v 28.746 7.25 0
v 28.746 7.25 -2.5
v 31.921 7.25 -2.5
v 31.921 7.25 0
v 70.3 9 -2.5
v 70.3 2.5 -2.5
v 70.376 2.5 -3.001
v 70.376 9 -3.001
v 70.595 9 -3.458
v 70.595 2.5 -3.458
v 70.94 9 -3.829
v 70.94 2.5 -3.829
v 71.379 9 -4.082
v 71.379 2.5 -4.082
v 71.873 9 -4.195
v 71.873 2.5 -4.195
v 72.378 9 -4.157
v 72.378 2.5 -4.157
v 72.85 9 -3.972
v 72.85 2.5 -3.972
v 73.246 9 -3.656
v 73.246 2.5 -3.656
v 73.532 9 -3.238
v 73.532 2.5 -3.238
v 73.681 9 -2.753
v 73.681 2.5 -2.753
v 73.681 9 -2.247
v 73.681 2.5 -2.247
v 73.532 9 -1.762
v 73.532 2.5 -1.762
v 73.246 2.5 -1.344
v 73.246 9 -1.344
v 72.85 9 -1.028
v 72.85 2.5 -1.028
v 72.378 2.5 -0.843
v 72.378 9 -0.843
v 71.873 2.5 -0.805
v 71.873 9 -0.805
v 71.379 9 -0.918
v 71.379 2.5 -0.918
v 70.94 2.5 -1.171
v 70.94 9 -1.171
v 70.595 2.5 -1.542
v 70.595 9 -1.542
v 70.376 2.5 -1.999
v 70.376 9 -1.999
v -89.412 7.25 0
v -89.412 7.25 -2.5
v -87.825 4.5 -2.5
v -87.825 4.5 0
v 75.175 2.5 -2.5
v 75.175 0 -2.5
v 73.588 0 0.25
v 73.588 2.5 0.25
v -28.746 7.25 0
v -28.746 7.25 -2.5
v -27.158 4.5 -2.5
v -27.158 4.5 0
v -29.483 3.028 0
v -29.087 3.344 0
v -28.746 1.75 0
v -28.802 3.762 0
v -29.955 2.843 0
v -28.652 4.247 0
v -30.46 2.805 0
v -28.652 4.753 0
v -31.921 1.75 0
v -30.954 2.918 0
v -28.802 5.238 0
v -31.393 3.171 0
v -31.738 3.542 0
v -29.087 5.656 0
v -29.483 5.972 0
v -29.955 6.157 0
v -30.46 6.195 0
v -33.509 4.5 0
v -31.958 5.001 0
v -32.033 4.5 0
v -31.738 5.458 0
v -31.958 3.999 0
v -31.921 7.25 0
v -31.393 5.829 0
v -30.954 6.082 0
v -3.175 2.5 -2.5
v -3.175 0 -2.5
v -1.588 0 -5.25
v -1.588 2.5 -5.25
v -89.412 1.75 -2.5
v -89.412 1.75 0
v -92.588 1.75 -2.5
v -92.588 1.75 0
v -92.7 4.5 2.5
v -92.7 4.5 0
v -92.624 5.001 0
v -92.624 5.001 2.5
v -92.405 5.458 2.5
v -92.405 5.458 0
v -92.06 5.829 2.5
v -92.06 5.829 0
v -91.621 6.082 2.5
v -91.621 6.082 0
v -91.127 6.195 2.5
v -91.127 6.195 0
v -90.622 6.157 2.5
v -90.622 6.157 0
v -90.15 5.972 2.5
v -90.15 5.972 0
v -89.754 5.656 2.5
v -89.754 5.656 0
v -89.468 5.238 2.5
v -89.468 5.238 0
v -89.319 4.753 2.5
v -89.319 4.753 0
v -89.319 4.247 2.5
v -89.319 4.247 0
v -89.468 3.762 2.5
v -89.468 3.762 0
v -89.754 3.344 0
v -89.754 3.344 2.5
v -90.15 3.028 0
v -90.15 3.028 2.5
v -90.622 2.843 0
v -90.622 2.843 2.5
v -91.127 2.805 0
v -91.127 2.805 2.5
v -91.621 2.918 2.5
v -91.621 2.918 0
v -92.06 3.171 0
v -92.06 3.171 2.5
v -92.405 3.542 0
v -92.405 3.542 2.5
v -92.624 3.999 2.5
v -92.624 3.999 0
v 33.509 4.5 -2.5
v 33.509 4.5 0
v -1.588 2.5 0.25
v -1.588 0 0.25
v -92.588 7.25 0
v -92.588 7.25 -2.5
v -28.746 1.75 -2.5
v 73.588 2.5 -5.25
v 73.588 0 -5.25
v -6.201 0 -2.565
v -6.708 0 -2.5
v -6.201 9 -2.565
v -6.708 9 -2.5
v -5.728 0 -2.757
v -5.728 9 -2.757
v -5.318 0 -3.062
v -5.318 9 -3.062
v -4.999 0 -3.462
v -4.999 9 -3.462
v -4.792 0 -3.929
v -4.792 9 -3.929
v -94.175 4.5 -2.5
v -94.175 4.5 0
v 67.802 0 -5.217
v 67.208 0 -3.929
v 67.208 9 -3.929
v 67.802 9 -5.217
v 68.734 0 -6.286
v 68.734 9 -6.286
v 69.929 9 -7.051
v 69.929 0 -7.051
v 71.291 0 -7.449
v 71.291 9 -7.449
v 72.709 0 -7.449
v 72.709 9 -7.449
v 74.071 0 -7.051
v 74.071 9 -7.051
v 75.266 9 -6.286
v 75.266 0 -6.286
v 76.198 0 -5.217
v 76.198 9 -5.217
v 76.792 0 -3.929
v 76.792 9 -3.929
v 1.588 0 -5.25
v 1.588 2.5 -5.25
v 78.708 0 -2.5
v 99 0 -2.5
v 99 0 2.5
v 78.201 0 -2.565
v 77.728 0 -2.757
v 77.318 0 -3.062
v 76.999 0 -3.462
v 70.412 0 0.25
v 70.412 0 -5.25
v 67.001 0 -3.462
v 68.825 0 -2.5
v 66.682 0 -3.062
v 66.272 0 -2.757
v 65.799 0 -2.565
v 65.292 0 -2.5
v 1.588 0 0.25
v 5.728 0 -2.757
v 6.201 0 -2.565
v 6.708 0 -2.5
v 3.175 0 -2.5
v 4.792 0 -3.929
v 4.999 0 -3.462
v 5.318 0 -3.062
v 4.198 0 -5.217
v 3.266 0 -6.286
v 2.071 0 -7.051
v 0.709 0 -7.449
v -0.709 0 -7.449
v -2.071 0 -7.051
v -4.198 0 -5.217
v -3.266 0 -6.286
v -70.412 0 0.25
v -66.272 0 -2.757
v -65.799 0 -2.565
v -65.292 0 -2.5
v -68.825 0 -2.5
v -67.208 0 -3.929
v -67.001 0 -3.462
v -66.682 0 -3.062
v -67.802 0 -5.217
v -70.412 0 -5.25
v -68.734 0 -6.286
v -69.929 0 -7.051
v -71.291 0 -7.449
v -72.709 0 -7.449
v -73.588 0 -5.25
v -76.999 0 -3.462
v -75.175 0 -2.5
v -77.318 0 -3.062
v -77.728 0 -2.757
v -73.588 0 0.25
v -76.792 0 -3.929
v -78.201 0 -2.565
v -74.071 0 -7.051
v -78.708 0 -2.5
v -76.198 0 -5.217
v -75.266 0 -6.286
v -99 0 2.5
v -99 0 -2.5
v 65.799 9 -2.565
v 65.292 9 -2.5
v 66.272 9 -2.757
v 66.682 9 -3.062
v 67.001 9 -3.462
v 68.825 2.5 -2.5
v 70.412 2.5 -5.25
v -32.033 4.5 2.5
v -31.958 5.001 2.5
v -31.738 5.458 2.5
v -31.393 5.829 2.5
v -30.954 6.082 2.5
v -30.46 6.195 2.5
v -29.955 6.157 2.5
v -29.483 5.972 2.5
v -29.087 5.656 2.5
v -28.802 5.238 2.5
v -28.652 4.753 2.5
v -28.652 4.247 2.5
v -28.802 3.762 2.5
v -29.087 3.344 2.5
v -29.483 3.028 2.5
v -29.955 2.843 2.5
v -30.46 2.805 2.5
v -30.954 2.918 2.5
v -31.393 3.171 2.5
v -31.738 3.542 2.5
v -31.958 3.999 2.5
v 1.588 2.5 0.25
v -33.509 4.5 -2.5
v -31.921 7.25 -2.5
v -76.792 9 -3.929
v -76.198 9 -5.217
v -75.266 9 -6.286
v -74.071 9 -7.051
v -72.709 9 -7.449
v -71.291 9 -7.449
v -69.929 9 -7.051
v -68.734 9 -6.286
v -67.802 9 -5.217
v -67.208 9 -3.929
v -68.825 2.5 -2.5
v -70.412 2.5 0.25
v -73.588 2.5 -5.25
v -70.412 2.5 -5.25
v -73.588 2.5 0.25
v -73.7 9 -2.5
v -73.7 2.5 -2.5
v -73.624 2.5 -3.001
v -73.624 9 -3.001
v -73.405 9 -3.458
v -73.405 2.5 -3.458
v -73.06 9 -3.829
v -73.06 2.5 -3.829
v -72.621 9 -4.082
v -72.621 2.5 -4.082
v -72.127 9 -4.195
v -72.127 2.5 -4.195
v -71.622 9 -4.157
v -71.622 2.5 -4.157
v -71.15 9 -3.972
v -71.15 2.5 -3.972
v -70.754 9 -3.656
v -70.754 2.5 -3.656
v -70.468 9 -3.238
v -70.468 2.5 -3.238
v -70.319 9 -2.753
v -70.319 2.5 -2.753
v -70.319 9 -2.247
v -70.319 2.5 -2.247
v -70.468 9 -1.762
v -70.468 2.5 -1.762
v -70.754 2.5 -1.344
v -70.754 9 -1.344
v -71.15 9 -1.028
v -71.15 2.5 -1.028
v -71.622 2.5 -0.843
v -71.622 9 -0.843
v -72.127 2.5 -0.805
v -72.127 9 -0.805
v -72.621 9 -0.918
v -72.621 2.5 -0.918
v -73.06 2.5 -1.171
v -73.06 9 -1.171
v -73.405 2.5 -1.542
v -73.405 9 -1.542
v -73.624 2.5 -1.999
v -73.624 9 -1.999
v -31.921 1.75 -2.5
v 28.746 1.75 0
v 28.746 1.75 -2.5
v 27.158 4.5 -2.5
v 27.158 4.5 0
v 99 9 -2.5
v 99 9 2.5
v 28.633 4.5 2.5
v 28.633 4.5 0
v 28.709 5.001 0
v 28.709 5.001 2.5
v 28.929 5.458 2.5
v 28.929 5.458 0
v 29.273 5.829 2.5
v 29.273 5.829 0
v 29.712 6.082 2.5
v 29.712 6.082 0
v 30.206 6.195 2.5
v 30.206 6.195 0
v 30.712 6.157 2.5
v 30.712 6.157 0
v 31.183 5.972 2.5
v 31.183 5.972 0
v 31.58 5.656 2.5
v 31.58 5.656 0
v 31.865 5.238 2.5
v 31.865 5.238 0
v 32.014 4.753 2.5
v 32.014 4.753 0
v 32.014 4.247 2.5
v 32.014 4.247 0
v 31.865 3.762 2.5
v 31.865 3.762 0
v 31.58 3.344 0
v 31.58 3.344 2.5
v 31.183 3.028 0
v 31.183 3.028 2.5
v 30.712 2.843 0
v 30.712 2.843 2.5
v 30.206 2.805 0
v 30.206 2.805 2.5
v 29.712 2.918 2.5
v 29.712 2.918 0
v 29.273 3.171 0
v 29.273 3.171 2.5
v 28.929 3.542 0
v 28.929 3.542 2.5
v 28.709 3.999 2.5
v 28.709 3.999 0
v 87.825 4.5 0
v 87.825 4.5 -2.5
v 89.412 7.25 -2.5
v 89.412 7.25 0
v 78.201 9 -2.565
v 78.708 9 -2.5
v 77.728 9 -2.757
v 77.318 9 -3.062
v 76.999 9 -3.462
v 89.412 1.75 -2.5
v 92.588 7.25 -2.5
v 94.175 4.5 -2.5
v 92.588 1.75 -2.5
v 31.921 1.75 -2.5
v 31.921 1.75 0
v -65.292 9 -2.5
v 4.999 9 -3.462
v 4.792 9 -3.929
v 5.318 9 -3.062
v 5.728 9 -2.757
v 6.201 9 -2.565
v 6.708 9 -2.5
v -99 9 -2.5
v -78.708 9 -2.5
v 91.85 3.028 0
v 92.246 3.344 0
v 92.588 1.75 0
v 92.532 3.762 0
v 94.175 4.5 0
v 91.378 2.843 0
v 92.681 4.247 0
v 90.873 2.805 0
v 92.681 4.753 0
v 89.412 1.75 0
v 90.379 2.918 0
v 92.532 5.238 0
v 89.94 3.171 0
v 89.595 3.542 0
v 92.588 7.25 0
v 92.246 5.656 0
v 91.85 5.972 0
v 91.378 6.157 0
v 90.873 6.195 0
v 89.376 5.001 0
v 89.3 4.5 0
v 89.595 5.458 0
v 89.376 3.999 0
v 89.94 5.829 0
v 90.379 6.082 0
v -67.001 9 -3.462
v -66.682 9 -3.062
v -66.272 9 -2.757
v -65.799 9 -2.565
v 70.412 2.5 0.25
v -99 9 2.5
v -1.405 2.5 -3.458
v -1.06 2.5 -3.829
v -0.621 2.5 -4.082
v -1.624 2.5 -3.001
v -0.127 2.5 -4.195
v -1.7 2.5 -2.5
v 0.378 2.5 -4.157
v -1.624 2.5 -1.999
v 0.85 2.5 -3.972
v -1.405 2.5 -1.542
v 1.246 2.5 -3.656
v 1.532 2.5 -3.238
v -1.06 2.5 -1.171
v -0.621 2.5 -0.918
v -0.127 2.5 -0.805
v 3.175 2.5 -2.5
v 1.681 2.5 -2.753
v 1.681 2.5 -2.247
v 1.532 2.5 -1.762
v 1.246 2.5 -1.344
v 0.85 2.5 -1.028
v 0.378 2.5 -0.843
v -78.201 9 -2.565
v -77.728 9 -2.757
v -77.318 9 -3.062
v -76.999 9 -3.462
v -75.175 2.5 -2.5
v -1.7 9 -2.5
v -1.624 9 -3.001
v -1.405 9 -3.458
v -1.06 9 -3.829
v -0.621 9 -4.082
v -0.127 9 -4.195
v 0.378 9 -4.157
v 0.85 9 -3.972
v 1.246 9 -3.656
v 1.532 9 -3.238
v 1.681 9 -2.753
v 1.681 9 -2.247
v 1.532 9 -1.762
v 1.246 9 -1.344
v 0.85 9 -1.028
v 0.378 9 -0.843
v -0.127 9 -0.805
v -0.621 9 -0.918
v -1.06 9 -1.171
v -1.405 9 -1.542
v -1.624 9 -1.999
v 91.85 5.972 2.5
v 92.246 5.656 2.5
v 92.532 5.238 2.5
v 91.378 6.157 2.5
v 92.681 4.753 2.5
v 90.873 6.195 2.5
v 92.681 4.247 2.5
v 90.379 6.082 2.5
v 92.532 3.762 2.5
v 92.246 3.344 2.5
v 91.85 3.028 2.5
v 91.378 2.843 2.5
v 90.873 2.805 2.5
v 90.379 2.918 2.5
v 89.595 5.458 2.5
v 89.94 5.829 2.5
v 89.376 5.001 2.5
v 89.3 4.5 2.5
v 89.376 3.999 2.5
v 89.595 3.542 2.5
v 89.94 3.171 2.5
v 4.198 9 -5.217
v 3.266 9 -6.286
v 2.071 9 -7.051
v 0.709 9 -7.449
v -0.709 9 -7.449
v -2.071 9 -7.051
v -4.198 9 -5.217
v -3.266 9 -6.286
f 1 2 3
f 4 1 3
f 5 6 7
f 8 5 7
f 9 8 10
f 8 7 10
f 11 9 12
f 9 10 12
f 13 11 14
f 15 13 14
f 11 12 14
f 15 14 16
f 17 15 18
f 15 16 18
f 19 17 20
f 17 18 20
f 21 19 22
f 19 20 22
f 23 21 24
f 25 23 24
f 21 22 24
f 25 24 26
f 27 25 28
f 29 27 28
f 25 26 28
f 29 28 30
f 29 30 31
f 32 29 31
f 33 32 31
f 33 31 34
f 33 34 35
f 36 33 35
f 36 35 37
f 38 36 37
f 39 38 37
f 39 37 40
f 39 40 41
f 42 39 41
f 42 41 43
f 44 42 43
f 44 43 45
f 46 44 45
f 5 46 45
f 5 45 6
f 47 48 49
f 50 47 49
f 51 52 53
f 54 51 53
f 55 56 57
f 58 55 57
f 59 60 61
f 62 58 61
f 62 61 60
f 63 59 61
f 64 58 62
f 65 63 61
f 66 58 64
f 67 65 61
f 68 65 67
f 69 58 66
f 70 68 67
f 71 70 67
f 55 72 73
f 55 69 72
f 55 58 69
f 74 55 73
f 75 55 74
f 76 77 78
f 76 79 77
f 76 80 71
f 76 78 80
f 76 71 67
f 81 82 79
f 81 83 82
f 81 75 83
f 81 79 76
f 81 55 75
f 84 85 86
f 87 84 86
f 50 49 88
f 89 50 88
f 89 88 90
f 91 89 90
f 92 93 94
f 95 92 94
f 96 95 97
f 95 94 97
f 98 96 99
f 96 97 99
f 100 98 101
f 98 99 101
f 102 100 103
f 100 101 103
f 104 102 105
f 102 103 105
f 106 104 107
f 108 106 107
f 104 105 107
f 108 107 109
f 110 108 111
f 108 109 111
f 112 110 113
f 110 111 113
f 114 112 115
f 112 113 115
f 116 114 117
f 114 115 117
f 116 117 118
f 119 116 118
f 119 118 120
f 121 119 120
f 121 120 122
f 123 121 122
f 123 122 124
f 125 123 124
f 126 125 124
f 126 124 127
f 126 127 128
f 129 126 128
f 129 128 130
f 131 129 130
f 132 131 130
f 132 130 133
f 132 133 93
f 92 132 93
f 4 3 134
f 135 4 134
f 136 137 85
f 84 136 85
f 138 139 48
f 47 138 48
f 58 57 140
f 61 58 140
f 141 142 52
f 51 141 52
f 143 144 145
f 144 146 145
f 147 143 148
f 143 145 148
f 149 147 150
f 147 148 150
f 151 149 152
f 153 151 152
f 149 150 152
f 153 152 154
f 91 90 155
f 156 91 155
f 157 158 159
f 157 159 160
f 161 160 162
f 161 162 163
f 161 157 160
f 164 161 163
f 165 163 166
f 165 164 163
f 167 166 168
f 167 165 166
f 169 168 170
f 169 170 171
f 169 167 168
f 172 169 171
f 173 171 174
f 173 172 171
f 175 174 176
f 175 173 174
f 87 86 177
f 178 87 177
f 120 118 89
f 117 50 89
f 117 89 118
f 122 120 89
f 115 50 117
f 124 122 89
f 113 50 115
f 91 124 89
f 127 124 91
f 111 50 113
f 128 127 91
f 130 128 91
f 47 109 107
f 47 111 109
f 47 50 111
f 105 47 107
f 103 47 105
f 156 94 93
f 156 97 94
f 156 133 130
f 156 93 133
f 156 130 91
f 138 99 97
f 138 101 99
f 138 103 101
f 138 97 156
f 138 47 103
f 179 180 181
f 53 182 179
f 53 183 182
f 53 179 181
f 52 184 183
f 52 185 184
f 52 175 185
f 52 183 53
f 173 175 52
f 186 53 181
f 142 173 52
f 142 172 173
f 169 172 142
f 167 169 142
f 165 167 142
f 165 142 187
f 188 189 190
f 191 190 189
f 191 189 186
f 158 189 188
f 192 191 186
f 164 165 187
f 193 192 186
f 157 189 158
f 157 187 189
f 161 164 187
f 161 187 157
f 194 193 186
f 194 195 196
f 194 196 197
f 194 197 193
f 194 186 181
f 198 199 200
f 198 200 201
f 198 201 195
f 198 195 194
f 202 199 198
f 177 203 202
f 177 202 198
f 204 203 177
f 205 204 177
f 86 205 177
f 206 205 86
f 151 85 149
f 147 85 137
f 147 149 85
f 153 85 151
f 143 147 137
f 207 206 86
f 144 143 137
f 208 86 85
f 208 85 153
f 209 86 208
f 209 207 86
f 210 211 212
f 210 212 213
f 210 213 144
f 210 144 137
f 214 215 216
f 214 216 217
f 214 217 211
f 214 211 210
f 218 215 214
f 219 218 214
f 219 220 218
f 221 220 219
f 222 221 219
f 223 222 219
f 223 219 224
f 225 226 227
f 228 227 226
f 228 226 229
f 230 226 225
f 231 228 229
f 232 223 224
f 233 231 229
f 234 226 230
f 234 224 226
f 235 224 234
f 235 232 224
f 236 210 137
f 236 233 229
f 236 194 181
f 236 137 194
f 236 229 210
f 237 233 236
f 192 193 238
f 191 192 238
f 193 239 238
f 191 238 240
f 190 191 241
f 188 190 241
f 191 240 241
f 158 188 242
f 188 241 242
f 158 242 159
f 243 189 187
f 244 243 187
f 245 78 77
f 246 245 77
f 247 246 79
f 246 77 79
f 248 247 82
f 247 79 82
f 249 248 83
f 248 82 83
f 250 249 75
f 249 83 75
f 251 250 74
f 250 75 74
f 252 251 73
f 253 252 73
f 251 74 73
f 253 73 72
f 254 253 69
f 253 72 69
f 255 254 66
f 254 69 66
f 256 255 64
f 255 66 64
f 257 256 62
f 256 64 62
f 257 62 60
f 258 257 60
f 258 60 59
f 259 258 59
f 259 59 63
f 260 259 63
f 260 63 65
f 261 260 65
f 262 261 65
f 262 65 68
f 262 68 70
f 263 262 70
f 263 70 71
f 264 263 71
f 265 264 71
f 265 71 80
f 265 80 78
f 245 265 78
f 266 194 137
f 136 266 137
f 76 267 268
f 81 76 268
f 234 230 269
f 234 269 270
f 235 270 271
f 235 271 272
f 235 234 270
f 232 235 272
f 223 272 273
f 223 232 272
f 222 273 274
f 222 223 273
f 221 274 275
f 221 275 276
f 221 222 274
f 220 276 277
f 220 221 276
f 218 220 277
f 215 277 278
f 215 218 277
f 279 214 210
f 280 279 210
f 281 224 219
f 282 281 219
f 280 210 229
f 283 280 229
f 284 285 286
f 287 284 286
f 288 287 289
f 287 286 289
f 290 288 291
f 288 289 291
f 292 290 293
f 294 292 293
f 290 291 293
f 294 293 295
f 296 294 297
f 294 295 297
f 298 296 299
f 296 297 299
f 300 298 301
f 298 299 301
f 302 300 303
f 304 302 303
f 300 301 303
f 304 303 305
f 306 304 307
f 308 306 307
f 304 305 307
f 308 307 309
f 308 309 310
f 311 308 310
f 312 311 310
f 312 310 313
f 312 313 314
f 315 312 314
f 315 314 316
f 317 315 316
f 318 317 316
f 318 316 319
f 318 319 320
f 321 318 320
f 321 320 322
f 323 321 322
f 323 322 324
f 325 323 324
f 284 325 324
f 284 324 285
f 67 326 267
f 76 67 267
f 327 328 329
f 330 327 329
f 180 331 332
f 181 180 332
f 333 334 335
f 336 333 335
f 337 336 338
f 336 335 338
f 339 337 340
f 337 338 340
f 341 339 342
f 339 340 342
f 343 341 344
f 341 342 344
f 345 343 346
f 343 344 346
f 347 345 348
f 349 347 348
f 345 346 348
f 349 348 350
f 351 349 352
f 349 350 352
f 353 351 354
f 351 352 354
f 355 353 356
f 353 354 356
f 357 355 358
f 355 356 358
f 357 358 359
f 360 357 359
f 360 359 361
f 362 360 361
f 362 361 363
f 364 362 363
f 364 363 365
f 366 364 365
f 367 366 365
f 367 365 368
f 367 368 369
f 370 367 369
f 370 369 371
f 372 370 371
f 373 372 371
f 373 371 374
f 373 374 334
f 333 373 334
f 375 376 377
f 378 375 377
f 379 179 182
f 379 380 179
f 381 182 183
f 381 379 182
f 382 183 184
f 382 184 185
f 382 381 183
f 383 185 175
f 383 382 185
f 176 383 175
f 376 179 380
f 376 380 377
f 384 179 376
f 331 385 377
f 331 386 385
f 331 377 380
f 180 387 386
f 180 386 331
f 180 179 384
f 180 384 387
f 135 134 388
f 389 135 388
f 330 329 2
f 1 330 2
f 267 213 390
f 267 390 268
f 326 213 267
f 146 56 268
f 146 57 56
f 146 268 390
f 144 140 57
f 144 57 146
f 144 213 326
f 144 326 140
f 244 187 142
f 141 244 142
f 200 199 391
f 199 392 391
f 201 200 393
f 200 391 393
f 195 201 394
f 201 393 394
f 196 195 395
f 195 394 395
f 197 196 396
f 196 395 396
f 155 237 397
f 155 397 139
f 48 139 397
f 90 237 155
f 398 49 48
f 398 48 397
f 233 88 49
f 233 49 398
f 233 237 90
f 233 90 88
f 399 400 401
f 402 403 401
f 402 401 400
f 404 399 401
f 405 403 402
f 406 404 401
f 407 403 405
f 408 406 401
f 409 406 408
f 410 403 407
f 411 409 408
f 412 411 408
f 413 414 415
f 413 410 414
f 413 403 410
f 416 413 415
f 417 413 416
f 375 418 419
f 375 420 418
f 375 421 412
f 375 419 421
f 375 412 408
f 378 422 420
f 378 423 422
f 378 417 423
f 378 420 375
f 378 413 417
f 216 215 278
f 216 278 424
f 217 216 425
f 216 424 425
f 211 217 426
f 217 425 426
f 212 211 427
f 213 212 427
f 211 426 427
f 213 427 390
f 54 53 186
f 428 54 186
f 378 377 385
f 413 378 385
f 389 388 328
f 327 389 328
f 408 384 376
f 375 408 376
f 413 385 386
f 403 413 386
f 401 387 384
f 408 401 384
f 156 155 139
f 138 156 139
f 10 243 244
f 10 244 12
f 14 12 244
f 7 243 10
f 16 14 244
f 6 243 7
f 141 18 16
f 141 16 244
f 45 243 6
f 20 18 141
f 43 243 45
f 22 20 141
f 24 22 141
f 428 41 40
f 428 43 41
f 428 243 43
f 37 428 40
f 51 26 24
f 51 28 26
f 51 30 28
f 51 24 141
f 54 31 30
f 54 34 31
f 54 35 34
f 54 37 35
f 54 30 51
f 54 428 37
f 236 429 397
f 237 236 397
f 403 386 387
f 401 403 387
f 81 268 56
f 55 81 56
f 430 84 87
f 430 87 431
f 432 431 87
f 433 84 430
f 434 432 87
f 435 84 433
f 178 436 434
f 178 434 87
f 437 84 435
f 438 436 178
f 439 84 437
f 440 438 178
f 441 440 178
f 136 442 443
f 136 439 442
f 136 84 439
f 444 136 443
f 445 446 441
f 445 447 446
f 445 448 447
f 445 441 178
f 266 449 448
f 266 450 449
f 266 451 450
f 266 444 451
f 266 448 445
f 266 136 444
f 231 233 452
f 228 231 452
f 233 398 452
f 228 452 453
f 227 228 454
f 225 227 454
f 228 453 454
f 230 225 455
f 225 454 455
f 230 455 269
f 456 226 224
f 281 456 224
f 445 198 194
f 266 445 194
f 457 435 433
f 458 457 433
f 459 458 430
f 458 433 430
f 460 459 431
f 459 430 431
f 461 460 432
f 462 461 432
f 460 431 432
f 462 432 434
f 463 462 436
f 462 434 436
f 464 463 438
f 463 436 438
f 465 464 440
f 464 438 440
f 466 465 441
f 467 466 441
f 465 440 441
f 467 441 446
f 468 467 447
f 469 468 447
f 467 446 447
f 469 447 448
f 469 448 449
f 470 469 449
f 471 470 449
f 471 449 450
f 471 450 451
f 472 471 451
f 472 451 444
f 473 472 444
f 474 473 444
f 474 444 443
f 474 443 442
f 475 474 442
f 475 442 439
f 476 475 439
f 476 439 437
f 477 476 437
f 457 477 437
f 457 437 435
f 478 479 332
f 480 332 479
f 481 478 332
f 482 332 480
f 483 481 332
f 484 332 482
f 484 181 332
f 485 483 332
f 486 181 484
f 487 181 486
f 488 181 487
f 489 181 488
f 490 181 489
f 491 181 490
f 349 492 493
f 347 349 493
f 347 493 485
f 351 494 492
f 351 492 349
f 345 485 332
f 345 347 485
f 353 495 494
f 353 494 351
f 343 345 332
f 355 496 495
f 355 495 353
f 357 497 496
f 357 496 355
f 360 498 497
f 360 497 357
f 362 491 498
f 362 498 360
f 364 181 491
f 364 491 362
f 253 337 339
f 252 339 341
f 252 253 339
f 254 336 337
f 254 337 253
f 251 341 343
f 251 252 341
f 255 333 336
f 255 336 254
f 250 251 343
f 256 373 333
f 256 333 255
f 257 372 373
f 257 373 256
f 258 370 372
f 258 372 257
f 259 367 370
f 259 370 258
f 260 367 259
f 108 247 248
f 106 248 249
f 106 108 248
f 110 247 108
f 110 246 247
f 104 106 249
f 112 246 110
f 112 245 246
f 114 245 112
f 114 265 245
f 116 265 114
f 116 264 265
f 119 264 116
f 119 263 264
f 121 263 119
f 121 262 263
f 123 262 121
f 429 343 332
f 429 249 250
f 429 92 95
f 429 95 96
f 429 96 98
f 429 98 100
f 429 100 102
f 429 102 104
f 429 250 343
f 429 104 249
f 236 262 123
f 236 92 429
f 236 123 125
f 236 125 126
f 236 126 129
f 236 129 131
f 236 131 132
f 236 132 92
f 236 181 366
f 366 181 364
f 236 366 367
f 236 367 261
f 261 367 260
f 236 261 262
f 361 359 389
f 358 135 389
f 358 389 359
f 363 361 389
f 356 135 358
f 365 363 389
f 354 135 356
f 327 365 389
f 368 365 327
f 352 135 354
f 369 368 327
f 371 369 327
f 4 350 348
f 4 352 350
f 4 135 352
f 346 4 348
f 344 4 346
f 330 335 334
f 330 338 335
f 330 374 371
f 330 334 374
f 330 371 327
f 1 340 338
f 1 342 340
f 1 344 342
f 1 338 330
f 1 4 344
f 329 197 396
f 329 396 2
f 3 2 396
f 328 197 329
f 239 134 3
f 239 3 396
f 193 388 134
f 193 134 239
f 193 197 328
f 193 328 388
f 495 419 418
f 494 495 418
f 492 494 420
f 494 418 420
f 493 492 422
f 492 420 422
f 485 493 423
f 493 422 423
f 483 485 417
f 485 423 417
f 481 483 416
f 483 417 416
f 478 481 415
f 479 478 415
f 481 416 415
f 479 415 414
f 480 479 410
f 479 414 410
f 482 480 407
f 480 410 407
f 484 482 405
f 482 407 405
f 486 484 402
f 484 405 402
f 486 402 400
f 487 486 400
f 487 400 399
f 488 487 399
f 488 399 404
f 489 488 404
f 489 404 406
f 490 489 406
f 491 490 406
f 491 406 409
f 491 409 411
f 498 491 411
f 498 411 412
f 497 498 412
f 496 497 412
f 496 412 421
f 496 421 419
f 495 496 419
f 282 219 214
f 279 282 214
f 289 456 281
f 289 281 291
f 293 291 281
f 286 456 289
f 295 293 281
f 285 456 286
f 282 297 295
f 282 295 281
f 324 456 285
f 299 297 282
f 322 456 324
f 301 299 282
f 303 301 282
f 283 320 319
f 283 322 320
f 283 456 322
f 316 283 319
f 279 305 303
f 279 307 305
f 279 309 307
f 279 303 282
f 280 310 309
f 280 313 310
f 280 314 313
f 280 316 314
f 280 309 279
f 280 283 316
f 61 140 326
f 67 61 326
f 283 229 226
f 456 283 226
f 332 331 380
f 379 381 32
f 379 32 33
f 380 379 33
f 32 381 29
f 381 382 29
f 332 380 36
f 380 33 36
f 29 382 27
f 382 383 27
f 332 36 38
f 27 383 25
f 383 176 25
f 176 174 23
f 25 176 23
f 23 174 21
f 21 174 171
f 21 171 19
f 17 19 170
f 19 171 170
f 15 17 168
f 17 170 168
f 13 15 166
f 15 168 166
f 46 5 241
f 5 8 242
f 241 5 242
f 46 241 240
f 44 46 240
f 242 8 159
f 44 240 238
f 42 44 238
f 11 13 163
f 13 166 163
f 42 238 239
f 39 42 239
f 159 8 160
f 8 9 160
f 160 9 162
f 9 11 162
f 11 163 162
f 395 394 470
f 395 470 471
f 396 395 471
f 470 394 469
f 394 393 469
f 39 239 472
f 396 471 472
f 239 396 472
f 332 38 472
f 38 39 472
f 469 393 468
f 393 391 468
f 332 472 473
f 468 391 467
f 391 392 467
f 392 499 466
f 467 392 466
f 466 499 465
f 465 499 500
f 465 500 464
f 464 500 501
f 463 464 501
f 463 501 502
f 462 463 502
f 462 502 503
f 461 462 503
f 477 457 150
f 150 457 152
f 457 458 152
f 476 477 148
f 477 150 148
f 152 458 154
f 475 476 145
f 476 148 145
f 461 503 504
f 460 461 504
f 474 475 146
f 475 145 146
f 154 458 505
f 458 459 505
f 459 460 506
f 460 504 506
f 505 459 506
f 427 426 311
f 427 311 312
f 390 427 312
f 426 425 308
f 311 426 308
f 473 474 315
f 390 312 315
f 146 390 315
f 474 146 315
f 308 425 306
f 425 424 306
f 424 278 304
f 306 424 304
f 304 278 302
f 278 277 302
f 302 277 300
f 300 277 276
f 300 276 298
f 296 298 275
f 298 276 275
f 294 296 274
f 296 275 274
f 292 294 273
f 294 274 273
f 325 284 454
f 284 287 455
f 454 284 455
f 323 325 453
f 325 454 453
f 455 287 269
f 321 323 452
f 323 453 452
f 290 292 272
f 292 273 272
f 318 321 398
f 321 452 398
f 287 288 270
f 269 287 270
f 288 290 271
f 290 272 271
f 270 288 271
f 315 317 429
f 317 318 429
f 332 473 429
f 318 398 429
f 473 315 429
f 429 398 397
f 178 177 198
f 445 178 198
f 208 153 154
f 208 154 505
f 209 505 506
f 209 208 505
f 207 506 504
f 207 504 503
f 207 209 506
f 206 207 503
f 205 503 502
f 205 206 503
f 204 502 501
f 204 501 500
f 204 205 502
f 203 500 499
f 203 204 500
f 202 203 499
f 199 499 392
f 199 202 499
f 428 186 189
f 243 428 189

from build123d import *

# Parameters (mm, degrees)
BOSS_EXTRU_1_DEPTH      = 9
D_GAGEMENT_M31_D        = 3.4
ENL_V_MAT_EXTRU_1_DEPTH = 2.5
D_GAGEMENT_M32_D        = 3.4
ENL_V_MAT_EXTRU_2_DEPTH = 2.5
CONG_1_R                = 2


with BuildPart() as part:
    # Esquisse1 → Boss.-Extru.1 (new body)
    with BuildSketch(Plane(origin=(0, 0, 0), x_dir=(1, 0, 0), z_dir=(0, 1, 0))):
        with BuildLine():
            Line((-99, 2.5), (-77, 2.5))
            ThreePointArc((-77, 2.5), (-72, 7.5), (-67, 2.5))
            Line((-67, 2.5), (-5, 2.5))
            ThreePointArc((-5, 2.5), (0, 7.5), (5, 2.5))
            Line((5, 2.5), (67, 2.5))
            ThreePointArc((67, 2.5), (72, 7.5), (77, 2.5))
            Line((77, 2.5), (99, 2.5))
            Line((99, 2.5), (99, -2.5))
            Line((99, -2.5), (-99, -2.5))
            Line((-99, -2.5), (-99, 2.5))
        make_face()
    extrude(amount=BOSS_EXTRU_1_DEPTH)

    # Dégagement M31 (through all)
    with Locations(Plane(origin=(0, 9, 0), x_dir=(1, 0, 0), z_dir=(0, 1, 0))):
        with Locations((-72, 2.5), (0, 2.5), (72, 2.5)):
            Hole(D_GAGEMENT_M31_D / 2)

    # Esquisse5 → Enlèv. mat.-Extru.1 (cut)
    with BuildSketch(Plane.XZ):
        Polygon((70.41228676, -5.25), (73.58771324, -5.25), (75.175426481, -2.5), (73.58771324, 0.25), (70.41228676, 0.25), (68.824573519, -2.5), align=None)
        Polygon((-1.58771324, -5.25), (1.58771324, -5.25), (3.175426481, -2.5), (1.58771324, 0.25), (-1.58771324, 0.25), (-3.175426481, -2.5), align=None)
        Polygon((-73.58771324, -5.25), (-70.41228676, -5.25), (-68.824573519, -2.5), (-70.41228676, 0.25), (-73.58771324, 0.25), (-75.175426481, -2.5), align=None)
    extrude(amount=-ENL_V_MAT_EXTRU_1_DEPTH, mode=Mode.SUBTRACT)

    # Dégagement M32 (through all)
    with Locations(Plane.XY.offset(2.5)):
        with Locations((-91, 4.5), (-30.333333333, 4.5), (30.333333333, 4.5), (91, 4.5)):
            Hole(D_GAGEMENT_M32_D / 2)

    # Esquisse9 → Enlèv. mat.-Extru.2 (cut)
    with BuildSketch(Plane(origin=(0, 0, -2.5), x_dir=(-1, 0, 0), z_dir=(0, 0, -1))):
        Polygon((-89.41228676, 7.25), (-92.58771324, 7.25), (-94.175426481, 4.5), (-92.58771324, 1.75), (-89.41228676, 1.75), (-87.824573519, 4.5), align=None)
        Polygon((-28.745620093, 7.25), (-31.921046574, 7.25), (-33.508759814, 4.5), (-31.921046574, 1.75), (-28.745620093, 1.75), (-27.157906853, 4.5), align=None)
        Polygon((31.921046574, 7.25), (28.745620093, 7.25), (27.157906853, 4.5), (28.745620093, 1.75), (31.921046574, 1.75), (33.508759814, 4.5), align=None)
        Polygon((92.58771324, 7.25), (89.41228676, 7.25), (87.824573519, 4.5), (89.41228676, 1.75), (92.58771324, 1.75), (94.175426481, 4.5), align=None)
    extrude(amount=-ENL_V_MAT_EXTRU_2_DEPTH, mode=Mode.SUBTRACT)

    # Congé1
    cong_1_edges = [part.edges().sort_by_distance(p)[0] for p in [
        (-77, 4.5, -2.5),
        (-67, 4.5, -2.5),
        (-5, 4.5, -2.5),
        (5, 4.5, -2.5),
        (67, 4.5, -2.5),
        (77, 4.5, -2.5),
    ]]
    fillet(cong_1_edges, radius=CONG_1_R)


solid = part.part
